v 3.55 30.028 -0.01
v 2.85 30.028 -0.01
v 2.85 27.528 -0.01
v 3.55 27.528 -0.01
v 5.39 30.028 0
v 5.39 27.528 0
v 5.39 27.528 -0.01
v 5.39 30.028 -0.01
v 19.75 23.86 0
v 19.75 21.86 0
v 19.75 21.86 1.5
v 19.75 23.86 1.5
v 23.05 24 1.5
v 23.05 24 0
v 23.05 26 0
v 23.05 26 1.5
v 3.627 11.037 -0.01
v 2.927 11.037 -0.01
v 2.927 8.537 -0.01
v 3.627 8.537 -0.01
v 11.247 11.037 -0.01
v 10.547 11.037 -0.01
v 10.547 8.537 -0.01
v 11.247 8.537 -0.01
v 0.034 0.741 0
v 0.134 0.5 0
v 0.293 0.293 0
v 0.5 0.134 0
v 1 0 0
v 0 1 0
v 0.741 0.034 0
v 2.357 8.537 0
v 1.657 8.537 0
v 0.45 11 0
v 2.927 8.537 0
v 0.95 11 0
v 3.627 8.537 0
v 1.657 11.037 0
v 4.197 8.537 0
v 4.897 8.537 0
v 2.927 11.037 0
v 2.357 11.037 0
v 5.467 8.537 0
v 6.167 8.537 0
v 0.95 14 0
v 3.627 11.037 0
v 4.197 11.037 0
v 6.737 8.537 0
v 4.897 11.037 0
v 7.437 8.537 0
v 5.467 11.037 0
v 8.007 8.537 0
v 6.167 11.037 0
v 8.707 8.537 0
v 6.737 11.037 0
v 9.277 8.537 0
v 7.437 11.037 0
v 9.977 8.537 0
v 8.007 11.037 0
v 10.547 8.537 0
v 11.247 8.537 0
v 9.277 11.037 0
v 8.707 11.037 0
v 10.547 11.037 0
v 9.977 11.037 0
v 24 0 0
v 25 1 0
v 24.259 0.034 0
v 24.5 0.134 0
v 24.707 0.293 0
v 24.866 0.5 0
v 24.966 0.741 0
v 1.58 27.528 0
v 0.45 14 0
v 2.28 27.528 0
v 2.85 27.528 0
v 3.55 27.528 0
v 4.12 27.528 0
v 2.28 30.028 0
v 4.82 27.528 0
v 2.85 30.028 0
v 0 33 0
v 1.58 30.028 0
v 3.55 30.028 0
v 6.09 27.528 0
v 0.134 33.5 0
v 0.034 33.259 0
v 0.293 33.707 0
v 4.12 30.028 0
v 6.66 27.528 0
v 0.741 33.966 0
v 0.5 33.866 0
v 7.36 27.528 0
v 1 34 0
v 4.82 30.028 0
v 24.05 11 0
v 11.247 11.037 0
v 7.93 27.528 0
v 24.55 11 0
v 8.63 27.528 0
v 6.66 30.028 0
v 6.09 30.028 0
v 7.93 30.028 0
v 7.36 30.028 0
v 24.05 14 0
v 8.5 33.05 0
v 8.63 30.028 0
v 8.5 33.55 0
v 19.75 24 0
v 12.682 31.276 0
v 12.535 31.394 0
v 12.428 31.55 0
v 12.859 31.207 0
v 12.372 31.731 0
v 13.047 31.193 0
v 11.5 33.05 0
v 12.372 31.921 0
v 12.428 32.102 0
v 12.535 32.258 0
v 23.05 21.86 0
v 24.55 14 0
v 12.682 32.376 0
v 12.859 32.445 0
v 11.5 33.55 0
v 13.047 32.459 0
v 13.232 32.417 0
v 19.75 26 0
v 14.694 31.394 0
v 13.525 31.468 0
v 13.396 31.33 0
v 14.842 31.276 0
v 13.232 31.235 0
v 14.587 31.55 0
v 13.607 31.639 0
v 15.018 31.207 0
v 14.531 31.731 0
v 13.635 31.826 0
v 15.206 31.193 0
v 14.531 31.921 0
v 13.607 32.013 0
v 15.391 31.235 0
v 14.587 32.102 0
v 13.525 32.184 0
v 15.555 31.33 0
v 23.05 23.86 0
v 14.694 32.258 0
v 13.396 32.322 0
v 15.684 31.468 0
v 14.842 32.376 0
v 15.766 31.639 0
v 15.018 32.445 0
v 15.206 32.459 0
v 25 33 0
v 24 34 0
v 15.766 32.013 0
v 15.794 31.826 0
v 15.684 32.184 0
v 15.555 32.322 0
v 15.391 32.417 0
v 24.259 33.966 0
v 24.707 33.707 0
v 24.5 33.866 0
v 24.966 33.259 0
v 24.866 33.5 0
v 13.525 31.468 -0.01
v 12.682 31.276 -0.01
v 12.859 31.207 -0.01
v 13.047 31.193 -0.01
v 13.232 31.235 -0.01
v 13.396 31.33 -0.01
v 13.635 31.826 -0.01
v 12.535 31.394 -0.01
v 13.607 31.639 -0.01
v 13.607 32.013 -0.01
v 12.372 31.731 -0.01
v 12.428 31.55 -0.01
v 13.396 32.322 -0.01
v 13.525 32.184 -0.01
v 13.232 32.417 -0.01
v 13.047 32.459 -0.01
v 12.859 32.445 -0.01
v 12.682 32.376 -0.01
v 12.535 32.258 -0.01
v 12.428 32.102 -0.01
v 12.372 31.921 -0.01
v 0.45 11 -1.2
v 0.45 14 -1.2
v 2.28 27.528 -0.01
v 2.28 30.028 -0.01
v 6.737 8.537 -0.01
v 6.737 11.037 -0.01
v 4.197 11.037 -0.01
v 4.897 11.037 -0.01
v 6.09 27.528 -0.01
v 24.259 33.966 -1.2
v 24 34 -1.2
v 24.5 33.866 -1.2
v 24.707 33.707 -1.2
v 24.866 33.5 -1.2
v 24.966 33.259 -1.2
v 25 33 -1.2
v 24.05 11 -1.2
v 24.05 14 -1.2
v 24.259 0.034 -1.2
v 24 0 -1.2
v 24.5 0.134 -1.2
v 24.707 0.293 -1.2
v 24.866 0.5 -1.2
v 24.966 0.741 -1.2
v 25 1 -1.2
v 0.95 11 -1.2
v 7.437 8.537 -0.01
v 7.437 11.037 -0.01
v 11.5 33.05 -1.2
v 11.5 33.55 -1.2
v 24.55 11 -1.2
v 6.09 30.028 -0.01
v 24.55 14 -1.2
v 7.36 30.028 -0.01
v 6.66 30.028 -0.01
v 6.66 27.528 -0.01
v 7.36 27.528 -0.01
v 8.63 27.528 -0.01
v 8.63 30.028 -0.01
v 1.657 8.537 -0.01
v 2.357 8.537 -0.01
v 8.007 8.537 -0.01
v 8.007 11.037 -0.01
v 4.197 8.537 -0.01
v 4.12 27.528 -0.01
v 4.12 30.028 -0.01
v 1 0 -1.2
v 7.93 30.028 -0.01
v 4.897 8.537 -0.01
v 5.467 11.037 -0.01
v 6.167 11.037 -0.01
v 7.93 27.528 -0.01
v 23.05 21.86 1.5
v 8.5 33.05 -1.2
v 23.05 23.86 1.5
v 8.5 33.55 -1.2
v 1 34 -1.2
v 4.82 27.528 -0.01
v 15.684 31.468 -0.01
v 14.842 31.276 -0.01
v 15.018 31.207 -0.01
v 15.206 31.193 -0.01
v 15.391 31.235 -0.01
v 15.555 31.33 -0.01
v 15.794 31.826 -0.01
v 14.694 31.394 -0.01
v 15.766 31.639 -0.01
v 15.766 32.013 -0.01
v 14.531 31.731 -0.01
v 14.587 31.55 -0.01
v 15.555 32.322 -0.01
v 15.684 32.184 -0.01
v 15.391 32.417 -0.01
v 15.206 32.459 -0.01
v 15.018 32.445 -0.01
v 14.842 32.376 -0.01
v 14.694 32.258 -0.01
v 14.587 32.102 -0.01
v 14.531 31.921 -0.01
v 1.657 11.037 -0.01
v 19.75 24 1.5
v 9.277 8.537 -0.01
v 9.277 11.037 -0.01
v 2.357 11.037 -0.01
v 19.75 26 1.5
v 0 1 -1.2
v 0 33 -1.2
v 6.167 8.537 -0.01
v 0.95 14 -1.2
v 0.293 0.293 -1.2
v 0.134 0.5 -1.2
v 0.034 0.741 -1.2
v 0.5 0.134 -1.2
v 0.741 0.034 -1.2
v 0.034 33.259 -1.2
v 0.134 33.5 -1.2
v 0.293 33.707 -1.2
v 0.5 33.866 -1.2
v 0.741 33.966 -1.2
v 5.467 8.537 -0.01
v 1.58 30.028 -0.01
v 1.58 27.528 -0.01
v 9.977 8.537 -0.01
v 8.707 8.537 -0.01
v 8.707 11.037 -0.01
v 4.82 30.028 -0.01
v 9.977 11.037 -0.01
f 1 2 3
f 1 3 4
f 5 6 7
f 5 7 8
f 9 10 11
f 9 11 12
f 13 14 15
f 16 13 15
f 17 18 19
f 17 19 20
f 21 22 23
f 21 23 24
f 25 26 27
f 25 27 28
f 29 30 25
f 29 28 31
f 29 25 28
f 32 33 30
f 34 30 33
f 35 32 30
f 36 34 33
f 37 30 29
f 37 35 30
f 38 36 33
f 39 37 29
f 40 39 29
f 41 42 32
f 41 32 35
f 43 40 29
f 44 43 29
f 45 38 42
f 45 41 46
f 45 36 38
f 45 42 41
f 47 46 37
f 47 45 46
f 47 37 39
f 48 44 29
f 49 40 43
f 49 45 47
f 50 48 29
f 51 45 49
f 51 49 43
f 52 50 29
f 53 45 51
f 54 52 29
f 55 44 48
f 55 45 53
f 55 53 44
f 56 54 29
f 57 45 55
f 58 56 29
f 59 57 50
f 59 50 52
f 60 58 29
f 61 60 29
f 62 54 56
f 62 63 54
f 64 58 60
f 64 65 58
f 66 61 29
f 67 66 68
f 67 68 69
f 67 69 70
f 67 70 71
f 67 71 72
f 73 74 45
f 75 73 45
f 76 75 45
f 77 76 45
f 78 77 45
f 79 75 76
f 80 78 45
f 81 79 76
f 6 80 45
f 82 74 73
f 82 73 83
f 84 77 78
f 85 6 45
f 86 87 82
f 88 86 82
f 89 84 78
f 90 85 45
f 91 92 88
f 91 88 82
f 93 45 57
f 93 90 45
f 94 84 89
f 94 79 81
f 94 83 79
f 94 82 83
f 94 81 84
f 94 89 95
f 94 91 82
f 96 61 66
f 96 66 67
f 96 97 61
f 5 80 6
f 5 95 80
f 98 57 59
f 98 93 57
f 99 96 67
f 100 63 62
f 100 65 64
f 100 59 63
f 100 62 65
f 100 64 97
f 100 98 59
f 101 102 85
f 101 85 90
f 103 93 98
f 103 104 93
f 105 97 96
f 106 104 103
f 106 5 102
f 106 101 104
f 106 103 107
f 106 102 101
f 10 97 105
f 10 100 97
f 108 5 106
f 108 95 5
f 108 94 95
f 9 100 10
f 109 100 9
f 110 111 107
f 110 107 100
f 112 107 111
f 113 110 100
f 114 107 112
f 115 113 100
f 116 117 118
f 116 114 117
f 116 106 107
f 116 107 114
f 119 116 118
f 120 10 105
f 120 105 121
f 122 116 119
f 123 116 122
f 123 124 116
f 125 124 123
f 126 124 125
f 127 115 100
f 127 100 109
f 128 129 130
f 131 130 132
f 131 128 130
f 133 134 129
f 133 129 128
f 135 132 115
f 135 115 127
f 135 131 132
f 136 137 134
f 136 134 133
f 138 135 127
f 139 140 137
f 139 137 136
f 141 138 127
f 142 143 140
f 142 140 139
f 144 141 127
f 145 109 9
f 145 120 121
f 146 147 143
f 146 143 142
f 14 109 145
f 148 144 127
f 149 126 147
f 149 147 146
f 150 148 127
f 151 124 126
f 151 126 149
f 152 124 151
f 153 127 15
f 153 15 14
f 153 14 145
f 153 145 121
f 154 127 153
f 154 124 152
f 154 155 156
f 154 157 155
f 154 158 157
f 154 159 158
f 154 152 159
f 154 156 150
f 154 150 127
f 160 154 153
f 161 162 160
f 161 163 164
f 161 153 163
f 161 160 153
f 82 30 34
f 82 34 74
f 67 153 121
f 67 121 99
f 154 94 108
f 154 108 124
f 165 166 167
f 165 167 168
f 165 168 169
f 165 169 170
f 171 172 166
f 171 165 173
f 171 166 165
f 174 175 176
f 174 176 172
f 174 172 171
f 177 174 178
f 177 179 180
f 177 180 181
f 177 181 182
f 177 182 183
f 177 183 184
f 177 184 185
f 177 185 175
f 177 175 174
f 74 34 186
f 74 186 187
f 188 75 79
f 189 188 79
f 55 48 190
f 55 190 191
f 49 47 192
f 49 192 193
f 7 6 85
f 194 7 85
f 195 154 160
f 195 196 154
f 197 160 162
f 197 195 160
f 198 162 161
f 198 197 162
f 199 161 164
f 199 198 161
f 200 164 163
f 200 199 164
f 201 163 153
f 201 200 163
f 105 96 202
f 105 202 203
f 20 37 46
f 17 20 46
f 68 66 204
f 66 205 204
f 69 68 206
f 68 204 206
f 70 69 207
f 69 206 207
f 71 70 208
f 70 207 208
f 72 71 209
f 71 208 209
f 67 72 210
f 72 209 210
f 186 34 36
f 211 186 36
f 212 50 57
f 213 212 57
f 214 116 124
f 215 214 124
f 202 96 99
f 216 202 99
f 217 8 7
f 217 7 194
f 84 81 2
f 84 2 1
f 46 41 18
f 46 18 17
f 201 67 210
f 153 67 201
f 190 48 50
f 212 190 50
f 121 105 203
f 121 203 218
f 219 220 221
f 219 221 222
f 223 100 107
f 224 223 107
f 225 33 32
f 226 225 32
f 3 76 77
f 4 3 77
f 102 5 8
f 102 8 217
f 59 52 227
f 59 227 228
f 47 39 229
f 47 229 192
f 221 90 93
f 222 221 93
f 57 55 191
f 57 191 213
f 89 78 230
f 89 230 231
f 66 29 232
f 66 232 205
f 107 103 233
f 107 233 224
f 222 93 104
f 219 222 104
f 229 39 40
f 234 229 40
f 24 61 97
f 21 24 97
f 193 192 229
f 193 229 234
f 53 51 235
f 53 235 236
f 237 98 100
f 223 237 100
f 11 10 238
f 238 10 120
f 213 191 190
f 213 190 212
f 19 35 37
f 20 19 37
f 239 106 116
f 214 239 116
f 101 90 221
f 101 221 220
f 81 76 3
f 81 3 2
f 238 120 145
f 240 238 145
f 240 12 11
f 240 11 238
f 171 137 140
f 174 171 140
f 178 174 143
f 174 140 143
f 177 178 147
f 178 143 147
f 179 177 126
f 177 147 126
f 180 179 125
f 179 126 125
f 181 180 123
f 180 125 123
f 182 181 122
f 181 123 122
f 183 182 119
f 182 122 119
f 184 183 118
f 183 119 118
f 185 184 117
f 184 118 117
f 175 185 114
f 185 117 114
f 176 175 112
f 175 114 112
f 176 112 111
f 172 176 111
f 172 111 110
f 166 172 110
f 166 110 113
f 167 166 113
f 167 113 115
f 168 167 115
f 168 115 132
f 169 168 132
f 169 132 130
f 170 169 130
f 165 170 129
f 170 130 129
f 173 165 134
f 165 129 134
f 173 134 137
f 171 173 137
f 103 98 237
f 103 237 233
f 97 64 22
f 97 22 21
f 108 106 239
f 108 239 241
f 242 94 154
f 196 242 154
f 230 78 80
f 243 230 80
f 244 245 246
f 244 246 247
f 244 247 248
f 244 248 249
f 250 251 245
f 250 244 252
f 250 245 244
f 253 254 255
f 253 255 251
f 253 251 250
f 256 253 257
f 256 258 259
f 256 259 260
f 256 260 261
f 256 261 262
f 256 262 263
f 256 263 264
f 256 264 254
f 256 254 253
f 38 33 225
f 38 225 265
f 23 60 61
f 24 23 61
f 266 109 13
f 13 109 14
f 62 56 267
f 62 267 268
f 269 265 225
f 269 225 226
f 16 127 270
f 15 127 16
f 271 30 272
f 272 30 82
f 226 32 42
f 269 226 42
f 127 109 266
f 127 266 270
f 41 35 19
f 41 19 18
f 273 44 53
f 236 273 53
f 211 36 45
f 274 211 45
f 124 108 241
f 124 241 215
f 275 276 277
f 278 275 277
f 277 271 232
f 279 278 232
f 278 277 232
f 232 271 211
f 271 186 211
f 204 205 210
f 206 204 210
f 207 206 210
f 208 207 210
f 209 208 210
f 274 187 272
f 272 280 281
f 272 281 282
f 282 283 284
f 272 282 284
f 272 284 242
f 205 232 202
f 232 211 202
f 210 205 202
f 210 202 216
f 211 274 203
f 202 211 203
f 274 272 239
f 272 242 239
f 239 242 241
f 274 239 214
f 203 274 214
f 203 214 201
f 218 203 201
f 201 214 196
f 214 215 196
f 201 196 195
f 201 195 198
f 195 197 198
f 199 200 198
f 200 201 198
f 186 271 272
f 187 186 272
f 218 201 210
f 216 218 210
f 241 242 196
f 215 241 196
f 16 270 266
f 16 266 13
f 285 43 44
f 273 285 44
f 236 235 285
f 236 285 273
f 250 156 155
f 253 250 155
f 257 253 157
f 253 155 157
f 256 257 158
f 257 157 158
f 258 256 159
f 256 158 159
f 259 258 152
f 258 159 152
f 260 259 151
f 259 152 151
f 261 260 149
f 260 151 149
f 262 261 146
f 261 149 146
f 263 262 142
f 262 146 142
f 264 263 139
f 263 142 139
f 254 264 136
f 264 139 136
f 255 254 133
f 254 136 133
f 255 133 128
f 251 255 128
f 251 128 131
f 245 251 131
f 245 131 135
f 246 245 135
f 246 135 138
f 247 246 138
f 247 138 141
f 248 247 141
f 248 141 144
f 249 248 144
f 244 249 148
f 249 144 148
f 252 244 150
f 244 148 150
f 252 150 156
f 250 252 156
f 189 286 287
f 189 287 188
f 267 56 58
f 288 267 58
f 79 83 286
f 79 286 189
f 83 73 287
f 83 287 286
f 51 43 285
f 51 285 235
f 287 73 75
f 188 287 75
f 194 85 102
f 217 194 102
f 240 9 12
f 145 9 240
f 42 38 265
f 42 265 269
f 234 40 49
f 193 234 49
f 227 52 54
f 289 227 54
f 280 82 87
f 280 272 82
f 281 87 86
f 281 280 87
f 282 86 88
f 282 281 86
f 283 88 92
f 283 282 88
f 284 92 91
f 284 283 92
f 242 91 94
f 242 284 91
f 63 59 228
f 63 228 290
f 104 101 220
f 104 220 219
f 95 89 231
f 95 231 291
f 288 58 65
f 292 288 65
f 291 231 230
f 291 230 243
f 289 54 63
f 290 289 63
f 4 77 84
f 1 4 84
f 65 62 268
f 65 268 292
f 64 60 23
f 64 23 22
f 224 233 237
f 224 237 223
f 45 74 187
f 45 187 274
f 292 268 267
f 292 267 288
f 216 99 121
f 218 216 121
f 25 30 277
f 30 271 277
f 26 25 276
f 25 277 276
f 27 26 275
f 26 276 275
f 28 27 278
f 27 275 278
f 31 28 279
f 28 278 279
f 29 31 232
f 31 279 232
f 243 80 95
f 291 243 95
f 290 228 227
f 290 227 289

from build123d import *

# Parameters (mm, degrees)
SKETCH_1_W          = 25
SKETCH_1_H          = 34
EXTRUDE_1_DEPTH     = 1.2
SKETCH_1_3_W        = 0.7
SKETCH_1_3_H        = 2.5
SKETCH_1_3_R        = 0.635
CUT_EXTRUDE_1_DEPTH = 0.01
SKETCH_1_4_W        = 3
SKETCH_1_4_H        = 0.5
SKETCH_1_4_W_2      = 0.5
SKETCH_1_4_H_2      = 3
CUT_EXTRUDE_2_DEPTH = 2.2
FILLET_1_R          = 1
SKETCH_1_5_W        = 3.3
SKETCH_1_5_H        = 2
EXTRUDE_2_DEPTH     = 1.5


with BuildPart() as part:
    # Sketch 1 → Extrude 1 (new body)
    with BuildSketch(Plane.XY):
        with Locations((12.5, 17)):
            Rectangle(SKETCH_1_W, SKETCH_1_H)
    extrude(amount=-EXTRUDE_1_DEPTH)

    # Sketch 1_3 → Cut-Extrude 1 (cut)
    with BuildSketch(Plane.XY):
        with Locations((1.93, 28.778)):
            Rectangle(SKETCH_1_3_W, SKETCH_1_3_H)
        with Locations((3.2, 28.778)):
            Rectangle(SKETCH_1_3_W, SKETCH_1_3_H)
        with Locations((5.74, 28.778)):
            Rectangle(SKETCH_1_3_W, SKETCH_1_3_H)
        with Locations((7.01, 28.778)):
            Rectangle(SKETCH_1_3_W, SKETCH_1_3_H)
        with Locations((8.28, 28.778)):
            Rectangle(SKETCH_1_3_W, SKETCH_1_3_H)
        with Locations((13, 31.826)):
            Circle(SKETCH_1_3_R)
        with Locations((15.159, 31.826)):
            Circle(SKETCH_1_3_R)
        with Locations((4.47, 28.778)):
            Rectangle(SKETCH_1_3_W, SKETCH_1_3_H)
        with Locations((2.007, 9.787)):
            Rectangle(SKETCH_1_3_W, SKETCH_1_3_H)
        with Locations((3.277, 9.787)):
            Rectangle(SKETCH_1_3_W, SKETCH_1_3_H)
        with Locations((4.547, 9.787)):
            Rectangle(SKETCH_1_3_W, SKETCH_1_3_H)
        with Locations((5.817, 9.787)):
            Rectangle(SKETCH_1_3_W, SKETCH_1_3_H)
        with Locations((7.087, 9.787)):
            Rectangle(SKETCH_1_3_W, SKETCH_1_3_H)
        with Locations((8.357, 9.787)):
            Rectangle(SKETCH_1_3_W, SKETCH_1_3_H)
        with Locations((9.627, 9.787)):
            Rectangle(SKETCH_1_3_W, SKETCH_1_3_H)
        with Locations((10.897, 9.787)):
            Rectangle(SKETCH_1_3_W, SKETCH_1_3_H)
    extrude(amount=-CUT_EXTRUDE_1_DEPTH, mode=Mode.SUBTRACT)

    # Sketch 1_4 → Cut-Extrude 2 (cut, through all)
    with BuildSketch(Plane.XY):
        with Locations((10, 33.3)):
            Rectangle(SKETCH_1_4_W, SKETCH_1_4_H)
        with Locations((0.7, 12.5)):
            Rectangle(SKETCH_1_4_W_2, SKETCH_1_4_H_2)
        with Locations((24.3, 12.5)):
            Rectangle(SKETCH_1_4_W_2, SKETCH_1_4_H_2)
    extrude(amount=-CUT_EXTRUDE_2_DEPTH, mode=Mode.SUBTRACT)

    # Fillet 1
    fillet_1_edges = [part.edges().sort_by_distance(p)[0] for p in [
        (0, 0, -0.6),
        (0, 34, -0.6),
        (25, 34, -0.6),
        (25, 0, -0.6),
    ]]
    fillet(fillet_1_edges, radius=FILLET_1_R)

    # Sketch 1_5 → Extrude 2 (add)
    with BuildSketch(Plane.XY):
        with Locations((21.4, 25)):
            Rectangle(SKETCH_1_5_W, SKETCH_1_5_H)
        with Locations((21.4, 22.86)):
            Rectangle(SKETCH_1_5_W, SKETCH_1_5_H)
    extrude(amount=EXTRUDE_2_DEPTH)


solid = part.part
